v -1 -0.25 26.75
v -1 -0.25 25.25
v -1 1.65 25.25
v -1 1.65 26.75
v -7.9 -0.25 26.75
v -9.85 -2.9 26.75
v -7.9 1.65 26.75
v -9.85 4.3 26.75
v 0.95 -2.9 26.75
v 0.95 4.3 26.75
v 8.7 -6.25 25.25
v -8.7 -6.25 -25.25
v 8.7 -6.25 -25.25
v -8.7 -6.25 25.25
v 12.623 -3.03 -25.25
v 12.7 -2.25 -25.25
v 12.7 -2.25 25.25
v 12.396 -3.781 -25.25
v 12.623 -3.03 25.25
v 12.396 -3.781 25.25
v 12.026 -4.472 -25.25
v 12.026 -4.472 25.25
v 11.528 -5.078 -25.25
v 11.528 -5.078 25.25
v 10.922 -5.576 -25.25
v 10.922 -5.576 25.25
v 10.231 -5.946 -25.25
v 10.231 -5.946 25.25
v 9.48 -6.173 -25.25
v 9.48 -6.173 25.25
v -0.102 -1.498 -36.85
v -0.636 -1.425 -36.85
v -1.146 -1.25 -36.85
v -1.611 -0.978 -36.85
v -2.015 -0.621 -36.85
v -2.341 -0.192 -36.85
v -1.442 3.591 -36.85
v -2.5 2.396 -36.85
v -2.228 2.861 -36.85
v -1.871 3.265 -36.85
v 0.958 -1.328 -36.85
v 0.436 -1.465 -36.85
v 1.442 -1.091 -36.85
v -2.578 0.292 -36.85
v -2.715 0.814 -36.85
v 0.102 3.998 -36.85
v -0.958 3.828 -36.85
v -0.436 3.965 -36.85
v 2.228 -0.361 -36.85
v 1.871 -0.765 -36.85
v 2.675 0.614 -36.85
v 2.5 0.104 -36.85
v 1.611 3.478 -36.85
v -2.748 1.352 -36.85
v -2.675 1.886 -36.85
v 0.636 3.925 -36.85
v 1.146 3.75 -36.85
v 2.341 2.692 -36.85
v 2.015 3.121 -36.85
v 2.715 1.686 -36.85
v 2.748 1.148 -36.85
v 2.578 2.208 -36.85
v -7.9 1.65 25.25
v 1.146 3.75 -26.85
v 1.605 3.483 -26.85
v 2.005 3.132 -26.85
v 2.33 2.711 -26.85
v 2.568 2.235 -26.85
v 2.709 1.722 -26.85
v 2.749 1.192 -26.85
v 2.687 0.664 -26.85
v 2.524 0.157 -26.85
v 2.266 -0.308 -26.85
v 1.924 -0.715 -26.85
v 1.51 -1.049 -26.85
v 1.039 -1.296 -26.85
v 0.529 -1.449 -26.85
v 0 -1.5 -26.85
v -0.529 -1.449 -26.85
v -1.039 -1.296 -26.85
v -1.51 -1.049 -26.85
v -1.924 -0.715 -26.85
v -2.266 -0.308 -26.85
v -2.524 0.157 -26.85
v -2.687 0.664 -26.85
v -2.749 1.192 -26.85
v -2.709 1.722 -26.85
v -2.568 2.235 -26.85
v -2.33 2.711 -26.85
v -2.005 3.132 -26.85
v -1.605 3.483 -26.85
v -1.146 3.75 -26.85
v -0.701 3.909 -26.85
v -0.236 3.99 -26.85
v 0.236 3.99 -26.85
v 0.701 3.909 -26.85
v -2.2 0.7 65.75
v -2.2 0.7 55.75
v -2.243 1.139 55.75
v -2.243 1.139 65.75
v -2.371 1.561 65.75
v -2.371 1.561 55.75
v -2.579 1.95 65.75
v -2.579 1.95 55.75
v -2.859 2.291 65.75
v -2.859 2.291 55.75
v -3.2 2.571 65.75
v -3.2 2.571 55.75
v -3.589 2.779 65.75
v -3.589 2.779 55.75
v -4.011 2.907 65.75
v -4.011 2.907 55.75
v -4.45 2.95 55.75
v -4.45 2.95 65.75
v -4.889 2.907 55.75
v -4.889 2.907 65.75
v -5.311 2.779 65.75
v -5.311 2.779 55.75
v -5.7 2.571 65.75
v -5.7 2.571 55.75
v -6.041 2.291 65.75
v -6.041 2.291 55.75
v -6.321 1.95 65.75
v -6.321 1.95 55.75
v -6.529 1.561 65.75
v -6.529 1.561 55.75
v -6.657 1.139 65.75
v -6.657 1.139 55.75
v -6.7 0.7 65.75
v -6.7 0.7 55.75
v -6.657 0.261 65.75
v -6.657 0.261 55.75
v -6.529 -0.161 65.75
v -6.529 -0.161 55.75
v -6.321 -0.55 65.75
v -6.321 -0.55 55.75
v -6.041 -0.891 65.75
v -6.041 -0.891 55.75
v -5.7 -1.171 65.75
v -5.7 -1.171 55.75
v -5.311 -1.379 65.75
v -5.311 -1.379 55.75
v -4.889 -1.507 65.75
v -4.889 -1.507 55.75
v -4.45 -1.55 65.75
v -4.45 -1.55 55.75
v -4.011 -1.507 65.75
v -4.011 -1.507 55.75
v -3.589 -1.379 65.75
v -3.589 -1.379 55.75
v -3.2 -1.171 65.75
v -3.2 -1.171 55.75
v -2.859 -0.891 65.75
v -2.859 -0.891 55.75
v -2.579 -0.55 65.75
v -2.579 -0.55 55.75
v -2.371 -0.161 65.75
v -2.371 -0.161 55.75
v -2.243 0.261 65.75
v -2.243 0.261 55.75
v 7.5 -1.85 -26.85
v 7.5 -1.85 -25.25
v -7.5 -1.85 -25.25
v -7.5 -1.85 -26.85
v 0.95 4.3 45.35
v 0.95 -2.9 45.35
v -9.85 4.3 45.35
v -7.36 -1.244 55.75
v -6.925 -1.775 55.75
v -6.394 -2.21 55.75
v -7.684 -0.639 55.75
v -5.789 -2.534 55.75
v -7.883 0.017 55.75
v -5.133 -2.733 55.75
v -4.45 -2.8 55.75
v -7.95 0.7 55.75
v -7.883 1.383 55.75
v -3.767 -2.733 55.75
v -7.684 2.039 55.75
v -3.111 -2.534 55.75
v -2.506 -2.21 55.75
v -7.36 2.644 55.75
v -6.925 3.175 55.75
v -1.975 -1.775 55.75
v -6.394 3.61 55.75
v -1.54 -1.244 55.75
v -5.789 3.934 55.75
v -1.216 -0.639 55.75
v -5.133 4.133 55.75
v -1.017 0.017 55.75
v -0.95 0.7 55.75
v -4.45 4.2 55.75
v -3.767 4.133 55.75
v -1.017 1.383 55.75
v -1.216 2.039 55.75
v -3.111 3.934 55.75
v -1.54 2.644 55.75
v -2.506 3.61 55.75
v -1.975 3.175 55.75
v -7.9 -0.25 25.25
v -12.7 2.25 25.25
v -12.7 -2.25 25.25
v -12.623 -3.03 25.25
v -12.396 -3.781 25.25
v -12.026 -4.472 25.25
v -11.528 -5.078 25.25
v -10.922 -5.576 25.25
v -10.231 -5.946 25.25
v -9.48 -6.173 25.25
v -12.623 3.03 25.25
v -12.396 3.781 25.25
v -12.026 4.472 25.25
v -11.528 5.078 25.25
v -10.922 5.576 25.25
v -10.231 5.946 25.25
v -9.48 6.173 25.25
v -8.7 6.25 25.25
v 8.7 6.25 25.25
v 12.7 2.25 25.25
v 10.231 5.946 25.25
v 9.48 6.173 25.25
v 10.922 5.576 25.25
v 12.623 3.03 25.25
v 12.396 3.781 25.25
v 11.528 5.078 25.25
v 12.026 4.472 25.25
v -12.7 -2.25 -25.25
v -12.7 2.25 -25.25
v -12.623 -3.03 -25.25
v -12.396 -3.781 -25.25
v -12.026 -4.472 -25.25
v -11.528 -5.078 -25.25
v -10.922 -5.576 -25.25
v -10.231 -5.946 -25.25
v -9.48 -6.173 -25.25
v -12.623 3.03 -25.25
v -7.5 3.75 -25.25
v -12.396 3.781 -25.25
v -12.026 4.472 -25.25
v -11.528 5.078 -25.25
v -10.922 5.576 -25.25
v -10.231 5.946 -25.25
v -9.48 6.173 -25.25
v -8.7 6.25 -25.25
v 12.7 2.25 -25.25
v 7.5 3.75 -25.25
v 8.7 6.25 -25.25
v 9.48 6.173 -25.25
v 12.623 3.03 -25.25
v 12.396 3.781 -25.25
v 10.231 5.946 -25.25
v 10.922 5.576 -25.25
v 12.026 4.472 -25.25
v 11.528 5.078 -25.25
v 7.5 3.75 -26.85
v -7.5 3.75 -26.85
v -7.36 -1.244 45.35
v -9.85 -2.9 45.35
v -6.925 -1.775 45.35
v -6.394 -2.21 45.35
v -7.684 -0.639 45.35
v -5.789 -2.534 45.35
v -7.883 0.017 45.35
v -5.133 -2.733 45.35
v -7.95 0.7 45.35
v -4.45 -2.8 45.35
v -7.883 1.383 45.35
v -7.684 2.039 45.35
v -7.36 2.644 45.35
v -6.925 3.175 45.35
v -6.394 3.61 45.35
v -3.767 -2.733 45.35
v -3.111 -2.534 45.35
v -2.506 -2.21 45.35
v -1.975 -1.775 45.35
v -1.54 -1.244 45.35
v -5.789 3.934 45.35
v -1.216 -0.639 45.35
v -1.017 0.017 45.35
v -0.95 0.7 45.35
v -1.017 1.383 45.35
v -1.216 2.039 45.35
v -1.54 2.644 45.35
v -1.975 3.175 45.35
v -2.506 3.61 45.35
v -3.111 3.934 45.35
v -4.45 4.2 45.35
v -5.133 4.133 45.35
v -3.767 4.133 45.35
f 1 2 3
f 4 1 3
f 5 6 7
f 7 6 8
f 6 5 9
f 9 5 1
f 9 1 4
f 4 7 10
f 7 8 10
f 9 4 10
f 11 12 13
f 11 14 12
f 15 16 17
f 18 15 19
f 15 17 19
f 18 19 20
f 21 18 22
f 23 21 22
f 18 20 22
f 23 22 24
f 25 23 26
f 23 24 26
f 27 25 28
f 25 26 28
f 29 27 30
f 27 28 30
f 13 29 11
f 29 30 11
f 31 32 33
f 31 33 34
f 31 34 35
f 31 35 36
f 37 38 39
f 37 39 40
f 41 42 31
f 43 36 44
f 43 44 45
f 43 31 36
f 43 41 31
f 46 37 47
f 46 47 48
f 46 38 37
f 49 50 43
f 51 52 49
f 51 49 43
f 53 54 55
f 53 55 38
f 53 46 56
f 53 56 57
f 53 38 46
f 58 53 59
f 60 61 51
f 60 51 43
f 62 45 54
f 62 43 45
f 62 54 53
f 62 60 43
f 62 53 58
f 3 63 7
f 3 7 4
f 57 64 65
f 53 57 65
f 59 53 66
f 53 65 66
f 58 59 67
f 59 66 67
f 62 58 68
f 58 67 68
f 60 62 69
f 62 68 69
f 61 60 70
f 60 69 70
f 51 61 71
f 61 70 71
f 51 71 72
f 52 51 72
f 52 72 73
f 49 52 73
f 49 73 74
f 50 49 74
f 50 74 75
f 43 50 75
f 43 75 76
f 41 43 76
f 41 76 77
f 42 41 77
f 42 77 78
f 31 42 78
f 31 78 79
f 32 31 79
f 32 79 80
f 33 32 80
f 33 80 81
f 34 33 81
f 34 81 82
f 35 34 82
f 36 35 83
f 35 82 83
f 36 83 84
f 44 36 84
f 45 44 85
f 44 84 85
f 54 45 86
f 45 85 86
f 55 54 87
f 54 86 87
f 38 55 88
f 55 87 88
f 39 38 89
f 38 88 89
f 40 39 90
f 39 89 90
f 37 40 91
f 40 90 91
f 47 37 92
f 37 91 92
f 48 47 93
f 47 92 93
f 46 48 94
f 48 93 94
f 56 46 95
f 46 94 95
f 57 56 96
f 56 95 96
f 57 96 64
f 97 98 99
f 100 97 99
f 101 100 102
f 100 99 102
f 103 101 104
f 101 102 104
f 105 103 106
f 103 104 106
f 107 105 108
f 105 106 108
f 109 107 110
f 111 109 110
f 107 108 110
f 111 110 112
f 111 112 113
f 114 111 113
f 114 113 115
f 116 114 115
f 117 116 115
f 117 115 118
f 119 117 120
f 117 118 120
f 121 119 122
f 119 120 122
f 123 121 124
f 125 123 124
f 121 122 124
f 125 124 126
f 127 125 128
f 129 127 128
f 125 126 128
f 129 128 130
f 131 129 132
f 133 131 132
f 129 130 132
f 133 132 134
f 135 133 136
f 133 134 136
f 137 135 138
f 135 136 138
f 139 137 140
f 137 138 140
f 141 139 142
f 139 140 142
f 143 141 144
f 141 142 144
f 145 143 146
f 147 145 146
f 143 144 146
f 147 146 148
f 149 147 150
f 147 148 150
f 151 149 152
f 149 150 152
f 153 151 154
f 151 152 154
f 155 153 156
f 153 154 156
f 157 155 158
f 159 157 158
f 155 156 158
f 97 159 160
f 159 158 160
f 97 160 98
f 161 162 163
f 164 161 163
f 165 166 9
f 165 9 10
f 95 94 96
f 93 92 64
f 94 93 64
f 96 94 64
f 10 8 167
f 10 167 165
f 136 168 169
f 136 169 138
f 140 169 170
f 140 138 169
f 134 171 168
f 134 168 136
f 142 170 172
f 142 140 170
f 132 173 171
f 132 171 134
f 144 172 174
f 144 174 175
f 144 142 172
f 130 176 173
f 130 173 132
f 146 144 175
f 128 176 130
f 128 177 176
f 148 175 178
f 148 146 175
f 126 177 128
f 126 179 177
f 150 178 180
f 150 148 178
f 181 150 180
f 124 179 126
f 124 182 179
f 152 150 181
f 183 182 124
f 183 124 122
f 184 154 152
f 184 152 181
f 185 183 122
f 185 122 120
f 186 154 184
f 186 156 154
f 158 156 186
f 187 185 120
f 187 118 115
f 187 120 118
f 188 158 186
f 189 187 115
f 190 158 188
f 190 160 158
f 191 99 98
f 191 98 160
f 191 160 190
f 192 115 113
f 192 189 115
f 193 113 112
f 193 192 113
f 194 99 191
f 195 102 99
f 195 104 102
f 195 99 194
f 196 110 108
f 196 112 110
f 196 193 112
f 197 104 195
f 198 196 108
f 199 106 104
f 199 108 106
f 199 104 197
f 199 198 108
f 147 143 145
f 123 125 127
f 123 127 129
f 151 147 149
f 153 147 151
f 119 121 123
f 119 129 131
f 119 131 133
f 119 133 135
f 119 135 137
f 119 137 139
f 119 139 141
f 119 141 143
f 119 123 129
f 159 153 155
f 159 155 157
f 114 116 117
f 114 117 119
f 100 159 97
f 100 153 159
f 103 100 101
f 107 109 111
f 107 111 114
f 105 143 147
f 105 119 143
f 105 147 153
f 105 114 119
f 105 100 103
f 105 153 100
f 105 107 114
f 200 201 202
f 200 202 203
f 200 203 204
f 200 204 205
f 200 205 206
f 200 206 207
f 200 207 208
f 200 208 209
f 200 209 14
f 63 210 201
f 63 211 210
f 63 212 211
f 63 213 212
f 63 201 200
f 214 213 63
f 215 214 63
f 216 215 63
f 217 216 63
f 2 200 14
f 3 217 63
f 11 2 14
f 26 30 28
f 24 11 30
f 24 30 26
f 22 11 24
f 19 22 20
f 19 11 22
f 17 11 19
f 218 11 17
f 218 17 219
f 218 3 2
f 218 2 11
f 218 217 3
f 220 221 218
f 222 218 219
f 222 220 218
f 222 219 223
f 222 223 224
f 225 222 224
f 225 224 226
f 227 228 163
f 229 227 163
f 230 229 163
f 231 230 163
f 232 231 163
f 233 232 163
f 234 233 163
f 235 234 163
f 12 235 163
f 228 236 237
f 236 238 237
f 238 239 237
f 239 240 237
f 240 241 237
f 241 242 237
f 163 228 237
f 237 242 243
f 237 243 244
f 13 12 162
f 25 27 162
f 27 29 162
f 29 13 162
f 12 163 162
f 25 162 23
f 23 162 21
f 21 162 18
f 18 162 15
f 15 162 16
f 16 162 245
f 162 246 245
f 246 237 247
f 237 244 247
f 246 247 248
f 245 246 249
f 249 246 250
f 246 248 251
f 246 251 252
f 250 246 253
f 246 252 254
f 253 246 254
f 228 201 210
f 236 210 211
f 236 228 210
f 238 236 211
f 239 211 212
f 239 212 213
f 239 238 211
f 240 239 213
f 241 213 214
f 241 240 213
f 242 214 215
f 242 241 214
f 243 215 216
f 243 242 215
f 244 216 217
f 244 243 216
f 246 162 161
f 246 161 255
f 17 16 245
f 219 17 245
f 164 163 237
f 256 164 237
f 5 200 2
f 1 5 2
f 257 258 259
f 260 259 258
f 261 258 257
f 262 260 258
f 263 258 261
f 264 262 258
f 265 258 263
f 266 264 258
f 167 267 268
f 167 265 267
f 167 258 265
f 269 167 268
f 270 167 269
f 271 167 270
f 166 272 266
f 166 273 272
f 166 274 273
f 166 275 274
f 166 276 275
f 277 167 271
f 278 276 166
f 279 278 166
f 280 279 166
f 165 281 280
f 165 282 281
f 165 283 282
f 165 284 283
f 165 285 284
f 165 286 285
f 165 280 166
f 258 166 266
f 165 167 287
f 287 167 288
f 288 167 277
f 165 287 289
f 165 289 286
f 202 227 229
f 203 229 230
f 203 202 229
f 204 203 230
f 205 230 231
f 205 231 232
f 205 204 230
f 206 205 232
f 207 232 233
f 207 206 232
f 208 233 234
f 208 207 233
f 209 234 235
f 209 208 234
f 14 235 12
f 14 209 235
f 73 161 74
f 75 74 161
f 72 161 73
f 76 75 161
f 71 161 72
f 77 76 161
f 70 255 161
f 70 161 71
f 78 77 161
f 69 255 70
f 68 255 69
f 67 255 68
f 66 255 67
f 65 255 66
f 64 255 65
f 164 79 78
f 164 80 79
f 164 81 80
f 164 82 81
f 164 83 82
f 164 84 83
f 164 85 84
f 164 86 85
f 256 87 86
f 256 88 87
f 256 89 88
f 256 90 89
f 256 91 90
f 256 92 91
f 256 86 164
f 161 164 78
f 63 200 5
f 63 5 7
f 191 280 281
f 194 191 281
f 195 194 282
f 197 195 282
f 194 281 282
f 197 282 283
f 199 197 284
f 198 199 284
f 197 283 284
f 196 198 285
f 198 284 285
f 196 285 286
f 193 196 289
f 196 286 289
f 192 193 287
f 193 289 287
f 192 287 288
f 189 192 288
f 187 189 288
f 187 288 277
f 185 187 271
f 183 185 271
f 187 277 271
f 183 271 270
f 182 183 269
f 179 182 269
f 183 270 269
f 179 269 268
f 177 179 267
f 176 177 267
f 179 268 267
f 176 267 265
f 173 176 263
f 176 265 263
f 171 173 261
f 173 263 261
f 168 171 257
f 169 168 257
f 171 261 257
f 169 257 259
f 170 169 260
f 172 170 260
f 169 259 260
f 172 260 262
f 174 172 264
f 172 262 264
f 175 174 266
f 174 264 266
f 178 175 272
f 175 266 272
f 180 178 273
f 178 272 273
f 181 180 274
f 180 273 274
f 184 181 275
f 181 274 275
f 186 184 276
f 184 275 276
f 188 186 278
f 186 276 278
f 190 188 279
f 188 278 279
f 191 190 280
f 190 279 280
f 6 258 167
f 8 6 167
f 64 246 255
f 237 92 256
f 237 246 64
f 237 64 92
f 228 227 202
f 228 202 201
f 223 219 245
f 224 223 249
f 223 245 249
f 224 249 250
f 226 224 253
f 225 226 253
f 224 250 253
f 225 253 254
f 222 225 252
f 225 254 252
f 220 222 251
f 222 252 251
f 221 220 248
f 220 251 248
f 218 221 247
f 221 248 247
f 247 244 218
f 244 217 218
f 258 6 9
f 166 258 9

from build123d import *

# Parameters (mm, degrees)
ESQUISSE1_W        = 25.4
ESQUISSE1_H        = 12.5
BOSS_EXTRU_1_DEPTH = 25.25
CONG_1_R           = 4
ESQUISSE2_W        = 6.9
ESQUISSE2_H        = 1.9
BOSS_EXTRU_2_DEPTH = 1.5
ESQUISSE3_W        = 10.8
ESQUISSE3_H        = 7.2
BOSS_EXTRU_3_DEPTH = 18.6
ESQUISSE4_R        = 3.5
BOSS_EXTRU_4_DEPTH = 10.4
ESQUISSE5_R        = 2.25
BOSS_EXTRU_5_DEPTH = 10
ESQUISSE7_W        = 15
ESQUISSE7_H        = 5.6
BOSS_EXTRU_7_DEPTH = 1.6
ESQUISSE6_R        = 2.75
BOSS_EXTRU_6_DEPTH = 10


with BuildPart() as part:
    # Esquisse1 → Boss.-Extru.1 (new, symmetric)
    with BuildSketch(Plane.XY):
        Rectangle(ESQUISSE1_W, ESQUISSE1_H)
    extrude(amount=BOSS_EXTRU_1_DEPTH, both=True)

    # Congé1
    cong_1_edges = [part.edges().sort_by_distance(p)[0] for p in [
        (-12.7, 6.25, 0),
        (12.7, 6.25, 0),
        (12.7, -6.25, 0),
        (-12.7, -6.25, 0),
    ]]
    fillet(cong_1_edges, radius=CONG_1_R)

    # Esquisse2 → Boss.-Extru.2 (add)
    with BuildSketch(Plane.XY.offset(25.25)):
        with Locations((-4.45, 0.7)):
            Rectangle(ESQUISSE2_W, ESQUISSE2_H)
    extrude(amount=BOSS_EXTRU_2_DEPTH)

    # Esquisse3 → Boss.-Extru.3 (add)
    with BuildSketch(Plane.XY.offset(26.75)):
        with Locations((-4.45, 0.7)):
            Rectangle(ESQUISSE3_W, ESQUISSE3_H)
    extrude(amount=BOSS_EXTRU_3_DEPTH)

    # Esquisse4 → Boss.-Extru.4 (add)
    with BuildSketch(Plane.XY.offset(45.35)):
        with Locations((-4.45, 0.7)):
            Circle(ESQUISSE4_R)
    extrude(amount=BOSS_EXTRU_4_DEPTH)

    # Esquisse5 → Boss.-Extru.5 (add)
    with BuildSketch(Plane.XY.offset(55.75)):
        with Locations((-4.45, 0.7)):
            Circle(ESQUISSE5_R)
    extrude(amount=BOSS_EXTRU_5_DEPTH)

    # Esquisse7 → Boss.-Extru.7 (add)
    with BuildSketch(Plane(origin=(0, 0, -25.25), x_dir=(-1, 0, 0), z_dir=(0, 0, -1))):
        with Locations((0, 0.95)):
            Rectangle(ESQUISSE7_W, ESQUISSE7_H)
    extrude(amount=BOSS_EXTRU_7_DEPTH)

    # Esquisse6 → Boss.-Extru.6 (add)
    with BuildSketch(Plane(origin=(0, 0, -26.85), x_dir=(-1, 0, 0), z_dir=(0, 0, -1))):
        with Locations(Location((0, 1.25, 0), (0, 0, 114.619977329))):
            Circle(ESQUISSE6_R)
    extrude(amount=BOSS_EXTRU_6_DEPTH)


solid = part.part
